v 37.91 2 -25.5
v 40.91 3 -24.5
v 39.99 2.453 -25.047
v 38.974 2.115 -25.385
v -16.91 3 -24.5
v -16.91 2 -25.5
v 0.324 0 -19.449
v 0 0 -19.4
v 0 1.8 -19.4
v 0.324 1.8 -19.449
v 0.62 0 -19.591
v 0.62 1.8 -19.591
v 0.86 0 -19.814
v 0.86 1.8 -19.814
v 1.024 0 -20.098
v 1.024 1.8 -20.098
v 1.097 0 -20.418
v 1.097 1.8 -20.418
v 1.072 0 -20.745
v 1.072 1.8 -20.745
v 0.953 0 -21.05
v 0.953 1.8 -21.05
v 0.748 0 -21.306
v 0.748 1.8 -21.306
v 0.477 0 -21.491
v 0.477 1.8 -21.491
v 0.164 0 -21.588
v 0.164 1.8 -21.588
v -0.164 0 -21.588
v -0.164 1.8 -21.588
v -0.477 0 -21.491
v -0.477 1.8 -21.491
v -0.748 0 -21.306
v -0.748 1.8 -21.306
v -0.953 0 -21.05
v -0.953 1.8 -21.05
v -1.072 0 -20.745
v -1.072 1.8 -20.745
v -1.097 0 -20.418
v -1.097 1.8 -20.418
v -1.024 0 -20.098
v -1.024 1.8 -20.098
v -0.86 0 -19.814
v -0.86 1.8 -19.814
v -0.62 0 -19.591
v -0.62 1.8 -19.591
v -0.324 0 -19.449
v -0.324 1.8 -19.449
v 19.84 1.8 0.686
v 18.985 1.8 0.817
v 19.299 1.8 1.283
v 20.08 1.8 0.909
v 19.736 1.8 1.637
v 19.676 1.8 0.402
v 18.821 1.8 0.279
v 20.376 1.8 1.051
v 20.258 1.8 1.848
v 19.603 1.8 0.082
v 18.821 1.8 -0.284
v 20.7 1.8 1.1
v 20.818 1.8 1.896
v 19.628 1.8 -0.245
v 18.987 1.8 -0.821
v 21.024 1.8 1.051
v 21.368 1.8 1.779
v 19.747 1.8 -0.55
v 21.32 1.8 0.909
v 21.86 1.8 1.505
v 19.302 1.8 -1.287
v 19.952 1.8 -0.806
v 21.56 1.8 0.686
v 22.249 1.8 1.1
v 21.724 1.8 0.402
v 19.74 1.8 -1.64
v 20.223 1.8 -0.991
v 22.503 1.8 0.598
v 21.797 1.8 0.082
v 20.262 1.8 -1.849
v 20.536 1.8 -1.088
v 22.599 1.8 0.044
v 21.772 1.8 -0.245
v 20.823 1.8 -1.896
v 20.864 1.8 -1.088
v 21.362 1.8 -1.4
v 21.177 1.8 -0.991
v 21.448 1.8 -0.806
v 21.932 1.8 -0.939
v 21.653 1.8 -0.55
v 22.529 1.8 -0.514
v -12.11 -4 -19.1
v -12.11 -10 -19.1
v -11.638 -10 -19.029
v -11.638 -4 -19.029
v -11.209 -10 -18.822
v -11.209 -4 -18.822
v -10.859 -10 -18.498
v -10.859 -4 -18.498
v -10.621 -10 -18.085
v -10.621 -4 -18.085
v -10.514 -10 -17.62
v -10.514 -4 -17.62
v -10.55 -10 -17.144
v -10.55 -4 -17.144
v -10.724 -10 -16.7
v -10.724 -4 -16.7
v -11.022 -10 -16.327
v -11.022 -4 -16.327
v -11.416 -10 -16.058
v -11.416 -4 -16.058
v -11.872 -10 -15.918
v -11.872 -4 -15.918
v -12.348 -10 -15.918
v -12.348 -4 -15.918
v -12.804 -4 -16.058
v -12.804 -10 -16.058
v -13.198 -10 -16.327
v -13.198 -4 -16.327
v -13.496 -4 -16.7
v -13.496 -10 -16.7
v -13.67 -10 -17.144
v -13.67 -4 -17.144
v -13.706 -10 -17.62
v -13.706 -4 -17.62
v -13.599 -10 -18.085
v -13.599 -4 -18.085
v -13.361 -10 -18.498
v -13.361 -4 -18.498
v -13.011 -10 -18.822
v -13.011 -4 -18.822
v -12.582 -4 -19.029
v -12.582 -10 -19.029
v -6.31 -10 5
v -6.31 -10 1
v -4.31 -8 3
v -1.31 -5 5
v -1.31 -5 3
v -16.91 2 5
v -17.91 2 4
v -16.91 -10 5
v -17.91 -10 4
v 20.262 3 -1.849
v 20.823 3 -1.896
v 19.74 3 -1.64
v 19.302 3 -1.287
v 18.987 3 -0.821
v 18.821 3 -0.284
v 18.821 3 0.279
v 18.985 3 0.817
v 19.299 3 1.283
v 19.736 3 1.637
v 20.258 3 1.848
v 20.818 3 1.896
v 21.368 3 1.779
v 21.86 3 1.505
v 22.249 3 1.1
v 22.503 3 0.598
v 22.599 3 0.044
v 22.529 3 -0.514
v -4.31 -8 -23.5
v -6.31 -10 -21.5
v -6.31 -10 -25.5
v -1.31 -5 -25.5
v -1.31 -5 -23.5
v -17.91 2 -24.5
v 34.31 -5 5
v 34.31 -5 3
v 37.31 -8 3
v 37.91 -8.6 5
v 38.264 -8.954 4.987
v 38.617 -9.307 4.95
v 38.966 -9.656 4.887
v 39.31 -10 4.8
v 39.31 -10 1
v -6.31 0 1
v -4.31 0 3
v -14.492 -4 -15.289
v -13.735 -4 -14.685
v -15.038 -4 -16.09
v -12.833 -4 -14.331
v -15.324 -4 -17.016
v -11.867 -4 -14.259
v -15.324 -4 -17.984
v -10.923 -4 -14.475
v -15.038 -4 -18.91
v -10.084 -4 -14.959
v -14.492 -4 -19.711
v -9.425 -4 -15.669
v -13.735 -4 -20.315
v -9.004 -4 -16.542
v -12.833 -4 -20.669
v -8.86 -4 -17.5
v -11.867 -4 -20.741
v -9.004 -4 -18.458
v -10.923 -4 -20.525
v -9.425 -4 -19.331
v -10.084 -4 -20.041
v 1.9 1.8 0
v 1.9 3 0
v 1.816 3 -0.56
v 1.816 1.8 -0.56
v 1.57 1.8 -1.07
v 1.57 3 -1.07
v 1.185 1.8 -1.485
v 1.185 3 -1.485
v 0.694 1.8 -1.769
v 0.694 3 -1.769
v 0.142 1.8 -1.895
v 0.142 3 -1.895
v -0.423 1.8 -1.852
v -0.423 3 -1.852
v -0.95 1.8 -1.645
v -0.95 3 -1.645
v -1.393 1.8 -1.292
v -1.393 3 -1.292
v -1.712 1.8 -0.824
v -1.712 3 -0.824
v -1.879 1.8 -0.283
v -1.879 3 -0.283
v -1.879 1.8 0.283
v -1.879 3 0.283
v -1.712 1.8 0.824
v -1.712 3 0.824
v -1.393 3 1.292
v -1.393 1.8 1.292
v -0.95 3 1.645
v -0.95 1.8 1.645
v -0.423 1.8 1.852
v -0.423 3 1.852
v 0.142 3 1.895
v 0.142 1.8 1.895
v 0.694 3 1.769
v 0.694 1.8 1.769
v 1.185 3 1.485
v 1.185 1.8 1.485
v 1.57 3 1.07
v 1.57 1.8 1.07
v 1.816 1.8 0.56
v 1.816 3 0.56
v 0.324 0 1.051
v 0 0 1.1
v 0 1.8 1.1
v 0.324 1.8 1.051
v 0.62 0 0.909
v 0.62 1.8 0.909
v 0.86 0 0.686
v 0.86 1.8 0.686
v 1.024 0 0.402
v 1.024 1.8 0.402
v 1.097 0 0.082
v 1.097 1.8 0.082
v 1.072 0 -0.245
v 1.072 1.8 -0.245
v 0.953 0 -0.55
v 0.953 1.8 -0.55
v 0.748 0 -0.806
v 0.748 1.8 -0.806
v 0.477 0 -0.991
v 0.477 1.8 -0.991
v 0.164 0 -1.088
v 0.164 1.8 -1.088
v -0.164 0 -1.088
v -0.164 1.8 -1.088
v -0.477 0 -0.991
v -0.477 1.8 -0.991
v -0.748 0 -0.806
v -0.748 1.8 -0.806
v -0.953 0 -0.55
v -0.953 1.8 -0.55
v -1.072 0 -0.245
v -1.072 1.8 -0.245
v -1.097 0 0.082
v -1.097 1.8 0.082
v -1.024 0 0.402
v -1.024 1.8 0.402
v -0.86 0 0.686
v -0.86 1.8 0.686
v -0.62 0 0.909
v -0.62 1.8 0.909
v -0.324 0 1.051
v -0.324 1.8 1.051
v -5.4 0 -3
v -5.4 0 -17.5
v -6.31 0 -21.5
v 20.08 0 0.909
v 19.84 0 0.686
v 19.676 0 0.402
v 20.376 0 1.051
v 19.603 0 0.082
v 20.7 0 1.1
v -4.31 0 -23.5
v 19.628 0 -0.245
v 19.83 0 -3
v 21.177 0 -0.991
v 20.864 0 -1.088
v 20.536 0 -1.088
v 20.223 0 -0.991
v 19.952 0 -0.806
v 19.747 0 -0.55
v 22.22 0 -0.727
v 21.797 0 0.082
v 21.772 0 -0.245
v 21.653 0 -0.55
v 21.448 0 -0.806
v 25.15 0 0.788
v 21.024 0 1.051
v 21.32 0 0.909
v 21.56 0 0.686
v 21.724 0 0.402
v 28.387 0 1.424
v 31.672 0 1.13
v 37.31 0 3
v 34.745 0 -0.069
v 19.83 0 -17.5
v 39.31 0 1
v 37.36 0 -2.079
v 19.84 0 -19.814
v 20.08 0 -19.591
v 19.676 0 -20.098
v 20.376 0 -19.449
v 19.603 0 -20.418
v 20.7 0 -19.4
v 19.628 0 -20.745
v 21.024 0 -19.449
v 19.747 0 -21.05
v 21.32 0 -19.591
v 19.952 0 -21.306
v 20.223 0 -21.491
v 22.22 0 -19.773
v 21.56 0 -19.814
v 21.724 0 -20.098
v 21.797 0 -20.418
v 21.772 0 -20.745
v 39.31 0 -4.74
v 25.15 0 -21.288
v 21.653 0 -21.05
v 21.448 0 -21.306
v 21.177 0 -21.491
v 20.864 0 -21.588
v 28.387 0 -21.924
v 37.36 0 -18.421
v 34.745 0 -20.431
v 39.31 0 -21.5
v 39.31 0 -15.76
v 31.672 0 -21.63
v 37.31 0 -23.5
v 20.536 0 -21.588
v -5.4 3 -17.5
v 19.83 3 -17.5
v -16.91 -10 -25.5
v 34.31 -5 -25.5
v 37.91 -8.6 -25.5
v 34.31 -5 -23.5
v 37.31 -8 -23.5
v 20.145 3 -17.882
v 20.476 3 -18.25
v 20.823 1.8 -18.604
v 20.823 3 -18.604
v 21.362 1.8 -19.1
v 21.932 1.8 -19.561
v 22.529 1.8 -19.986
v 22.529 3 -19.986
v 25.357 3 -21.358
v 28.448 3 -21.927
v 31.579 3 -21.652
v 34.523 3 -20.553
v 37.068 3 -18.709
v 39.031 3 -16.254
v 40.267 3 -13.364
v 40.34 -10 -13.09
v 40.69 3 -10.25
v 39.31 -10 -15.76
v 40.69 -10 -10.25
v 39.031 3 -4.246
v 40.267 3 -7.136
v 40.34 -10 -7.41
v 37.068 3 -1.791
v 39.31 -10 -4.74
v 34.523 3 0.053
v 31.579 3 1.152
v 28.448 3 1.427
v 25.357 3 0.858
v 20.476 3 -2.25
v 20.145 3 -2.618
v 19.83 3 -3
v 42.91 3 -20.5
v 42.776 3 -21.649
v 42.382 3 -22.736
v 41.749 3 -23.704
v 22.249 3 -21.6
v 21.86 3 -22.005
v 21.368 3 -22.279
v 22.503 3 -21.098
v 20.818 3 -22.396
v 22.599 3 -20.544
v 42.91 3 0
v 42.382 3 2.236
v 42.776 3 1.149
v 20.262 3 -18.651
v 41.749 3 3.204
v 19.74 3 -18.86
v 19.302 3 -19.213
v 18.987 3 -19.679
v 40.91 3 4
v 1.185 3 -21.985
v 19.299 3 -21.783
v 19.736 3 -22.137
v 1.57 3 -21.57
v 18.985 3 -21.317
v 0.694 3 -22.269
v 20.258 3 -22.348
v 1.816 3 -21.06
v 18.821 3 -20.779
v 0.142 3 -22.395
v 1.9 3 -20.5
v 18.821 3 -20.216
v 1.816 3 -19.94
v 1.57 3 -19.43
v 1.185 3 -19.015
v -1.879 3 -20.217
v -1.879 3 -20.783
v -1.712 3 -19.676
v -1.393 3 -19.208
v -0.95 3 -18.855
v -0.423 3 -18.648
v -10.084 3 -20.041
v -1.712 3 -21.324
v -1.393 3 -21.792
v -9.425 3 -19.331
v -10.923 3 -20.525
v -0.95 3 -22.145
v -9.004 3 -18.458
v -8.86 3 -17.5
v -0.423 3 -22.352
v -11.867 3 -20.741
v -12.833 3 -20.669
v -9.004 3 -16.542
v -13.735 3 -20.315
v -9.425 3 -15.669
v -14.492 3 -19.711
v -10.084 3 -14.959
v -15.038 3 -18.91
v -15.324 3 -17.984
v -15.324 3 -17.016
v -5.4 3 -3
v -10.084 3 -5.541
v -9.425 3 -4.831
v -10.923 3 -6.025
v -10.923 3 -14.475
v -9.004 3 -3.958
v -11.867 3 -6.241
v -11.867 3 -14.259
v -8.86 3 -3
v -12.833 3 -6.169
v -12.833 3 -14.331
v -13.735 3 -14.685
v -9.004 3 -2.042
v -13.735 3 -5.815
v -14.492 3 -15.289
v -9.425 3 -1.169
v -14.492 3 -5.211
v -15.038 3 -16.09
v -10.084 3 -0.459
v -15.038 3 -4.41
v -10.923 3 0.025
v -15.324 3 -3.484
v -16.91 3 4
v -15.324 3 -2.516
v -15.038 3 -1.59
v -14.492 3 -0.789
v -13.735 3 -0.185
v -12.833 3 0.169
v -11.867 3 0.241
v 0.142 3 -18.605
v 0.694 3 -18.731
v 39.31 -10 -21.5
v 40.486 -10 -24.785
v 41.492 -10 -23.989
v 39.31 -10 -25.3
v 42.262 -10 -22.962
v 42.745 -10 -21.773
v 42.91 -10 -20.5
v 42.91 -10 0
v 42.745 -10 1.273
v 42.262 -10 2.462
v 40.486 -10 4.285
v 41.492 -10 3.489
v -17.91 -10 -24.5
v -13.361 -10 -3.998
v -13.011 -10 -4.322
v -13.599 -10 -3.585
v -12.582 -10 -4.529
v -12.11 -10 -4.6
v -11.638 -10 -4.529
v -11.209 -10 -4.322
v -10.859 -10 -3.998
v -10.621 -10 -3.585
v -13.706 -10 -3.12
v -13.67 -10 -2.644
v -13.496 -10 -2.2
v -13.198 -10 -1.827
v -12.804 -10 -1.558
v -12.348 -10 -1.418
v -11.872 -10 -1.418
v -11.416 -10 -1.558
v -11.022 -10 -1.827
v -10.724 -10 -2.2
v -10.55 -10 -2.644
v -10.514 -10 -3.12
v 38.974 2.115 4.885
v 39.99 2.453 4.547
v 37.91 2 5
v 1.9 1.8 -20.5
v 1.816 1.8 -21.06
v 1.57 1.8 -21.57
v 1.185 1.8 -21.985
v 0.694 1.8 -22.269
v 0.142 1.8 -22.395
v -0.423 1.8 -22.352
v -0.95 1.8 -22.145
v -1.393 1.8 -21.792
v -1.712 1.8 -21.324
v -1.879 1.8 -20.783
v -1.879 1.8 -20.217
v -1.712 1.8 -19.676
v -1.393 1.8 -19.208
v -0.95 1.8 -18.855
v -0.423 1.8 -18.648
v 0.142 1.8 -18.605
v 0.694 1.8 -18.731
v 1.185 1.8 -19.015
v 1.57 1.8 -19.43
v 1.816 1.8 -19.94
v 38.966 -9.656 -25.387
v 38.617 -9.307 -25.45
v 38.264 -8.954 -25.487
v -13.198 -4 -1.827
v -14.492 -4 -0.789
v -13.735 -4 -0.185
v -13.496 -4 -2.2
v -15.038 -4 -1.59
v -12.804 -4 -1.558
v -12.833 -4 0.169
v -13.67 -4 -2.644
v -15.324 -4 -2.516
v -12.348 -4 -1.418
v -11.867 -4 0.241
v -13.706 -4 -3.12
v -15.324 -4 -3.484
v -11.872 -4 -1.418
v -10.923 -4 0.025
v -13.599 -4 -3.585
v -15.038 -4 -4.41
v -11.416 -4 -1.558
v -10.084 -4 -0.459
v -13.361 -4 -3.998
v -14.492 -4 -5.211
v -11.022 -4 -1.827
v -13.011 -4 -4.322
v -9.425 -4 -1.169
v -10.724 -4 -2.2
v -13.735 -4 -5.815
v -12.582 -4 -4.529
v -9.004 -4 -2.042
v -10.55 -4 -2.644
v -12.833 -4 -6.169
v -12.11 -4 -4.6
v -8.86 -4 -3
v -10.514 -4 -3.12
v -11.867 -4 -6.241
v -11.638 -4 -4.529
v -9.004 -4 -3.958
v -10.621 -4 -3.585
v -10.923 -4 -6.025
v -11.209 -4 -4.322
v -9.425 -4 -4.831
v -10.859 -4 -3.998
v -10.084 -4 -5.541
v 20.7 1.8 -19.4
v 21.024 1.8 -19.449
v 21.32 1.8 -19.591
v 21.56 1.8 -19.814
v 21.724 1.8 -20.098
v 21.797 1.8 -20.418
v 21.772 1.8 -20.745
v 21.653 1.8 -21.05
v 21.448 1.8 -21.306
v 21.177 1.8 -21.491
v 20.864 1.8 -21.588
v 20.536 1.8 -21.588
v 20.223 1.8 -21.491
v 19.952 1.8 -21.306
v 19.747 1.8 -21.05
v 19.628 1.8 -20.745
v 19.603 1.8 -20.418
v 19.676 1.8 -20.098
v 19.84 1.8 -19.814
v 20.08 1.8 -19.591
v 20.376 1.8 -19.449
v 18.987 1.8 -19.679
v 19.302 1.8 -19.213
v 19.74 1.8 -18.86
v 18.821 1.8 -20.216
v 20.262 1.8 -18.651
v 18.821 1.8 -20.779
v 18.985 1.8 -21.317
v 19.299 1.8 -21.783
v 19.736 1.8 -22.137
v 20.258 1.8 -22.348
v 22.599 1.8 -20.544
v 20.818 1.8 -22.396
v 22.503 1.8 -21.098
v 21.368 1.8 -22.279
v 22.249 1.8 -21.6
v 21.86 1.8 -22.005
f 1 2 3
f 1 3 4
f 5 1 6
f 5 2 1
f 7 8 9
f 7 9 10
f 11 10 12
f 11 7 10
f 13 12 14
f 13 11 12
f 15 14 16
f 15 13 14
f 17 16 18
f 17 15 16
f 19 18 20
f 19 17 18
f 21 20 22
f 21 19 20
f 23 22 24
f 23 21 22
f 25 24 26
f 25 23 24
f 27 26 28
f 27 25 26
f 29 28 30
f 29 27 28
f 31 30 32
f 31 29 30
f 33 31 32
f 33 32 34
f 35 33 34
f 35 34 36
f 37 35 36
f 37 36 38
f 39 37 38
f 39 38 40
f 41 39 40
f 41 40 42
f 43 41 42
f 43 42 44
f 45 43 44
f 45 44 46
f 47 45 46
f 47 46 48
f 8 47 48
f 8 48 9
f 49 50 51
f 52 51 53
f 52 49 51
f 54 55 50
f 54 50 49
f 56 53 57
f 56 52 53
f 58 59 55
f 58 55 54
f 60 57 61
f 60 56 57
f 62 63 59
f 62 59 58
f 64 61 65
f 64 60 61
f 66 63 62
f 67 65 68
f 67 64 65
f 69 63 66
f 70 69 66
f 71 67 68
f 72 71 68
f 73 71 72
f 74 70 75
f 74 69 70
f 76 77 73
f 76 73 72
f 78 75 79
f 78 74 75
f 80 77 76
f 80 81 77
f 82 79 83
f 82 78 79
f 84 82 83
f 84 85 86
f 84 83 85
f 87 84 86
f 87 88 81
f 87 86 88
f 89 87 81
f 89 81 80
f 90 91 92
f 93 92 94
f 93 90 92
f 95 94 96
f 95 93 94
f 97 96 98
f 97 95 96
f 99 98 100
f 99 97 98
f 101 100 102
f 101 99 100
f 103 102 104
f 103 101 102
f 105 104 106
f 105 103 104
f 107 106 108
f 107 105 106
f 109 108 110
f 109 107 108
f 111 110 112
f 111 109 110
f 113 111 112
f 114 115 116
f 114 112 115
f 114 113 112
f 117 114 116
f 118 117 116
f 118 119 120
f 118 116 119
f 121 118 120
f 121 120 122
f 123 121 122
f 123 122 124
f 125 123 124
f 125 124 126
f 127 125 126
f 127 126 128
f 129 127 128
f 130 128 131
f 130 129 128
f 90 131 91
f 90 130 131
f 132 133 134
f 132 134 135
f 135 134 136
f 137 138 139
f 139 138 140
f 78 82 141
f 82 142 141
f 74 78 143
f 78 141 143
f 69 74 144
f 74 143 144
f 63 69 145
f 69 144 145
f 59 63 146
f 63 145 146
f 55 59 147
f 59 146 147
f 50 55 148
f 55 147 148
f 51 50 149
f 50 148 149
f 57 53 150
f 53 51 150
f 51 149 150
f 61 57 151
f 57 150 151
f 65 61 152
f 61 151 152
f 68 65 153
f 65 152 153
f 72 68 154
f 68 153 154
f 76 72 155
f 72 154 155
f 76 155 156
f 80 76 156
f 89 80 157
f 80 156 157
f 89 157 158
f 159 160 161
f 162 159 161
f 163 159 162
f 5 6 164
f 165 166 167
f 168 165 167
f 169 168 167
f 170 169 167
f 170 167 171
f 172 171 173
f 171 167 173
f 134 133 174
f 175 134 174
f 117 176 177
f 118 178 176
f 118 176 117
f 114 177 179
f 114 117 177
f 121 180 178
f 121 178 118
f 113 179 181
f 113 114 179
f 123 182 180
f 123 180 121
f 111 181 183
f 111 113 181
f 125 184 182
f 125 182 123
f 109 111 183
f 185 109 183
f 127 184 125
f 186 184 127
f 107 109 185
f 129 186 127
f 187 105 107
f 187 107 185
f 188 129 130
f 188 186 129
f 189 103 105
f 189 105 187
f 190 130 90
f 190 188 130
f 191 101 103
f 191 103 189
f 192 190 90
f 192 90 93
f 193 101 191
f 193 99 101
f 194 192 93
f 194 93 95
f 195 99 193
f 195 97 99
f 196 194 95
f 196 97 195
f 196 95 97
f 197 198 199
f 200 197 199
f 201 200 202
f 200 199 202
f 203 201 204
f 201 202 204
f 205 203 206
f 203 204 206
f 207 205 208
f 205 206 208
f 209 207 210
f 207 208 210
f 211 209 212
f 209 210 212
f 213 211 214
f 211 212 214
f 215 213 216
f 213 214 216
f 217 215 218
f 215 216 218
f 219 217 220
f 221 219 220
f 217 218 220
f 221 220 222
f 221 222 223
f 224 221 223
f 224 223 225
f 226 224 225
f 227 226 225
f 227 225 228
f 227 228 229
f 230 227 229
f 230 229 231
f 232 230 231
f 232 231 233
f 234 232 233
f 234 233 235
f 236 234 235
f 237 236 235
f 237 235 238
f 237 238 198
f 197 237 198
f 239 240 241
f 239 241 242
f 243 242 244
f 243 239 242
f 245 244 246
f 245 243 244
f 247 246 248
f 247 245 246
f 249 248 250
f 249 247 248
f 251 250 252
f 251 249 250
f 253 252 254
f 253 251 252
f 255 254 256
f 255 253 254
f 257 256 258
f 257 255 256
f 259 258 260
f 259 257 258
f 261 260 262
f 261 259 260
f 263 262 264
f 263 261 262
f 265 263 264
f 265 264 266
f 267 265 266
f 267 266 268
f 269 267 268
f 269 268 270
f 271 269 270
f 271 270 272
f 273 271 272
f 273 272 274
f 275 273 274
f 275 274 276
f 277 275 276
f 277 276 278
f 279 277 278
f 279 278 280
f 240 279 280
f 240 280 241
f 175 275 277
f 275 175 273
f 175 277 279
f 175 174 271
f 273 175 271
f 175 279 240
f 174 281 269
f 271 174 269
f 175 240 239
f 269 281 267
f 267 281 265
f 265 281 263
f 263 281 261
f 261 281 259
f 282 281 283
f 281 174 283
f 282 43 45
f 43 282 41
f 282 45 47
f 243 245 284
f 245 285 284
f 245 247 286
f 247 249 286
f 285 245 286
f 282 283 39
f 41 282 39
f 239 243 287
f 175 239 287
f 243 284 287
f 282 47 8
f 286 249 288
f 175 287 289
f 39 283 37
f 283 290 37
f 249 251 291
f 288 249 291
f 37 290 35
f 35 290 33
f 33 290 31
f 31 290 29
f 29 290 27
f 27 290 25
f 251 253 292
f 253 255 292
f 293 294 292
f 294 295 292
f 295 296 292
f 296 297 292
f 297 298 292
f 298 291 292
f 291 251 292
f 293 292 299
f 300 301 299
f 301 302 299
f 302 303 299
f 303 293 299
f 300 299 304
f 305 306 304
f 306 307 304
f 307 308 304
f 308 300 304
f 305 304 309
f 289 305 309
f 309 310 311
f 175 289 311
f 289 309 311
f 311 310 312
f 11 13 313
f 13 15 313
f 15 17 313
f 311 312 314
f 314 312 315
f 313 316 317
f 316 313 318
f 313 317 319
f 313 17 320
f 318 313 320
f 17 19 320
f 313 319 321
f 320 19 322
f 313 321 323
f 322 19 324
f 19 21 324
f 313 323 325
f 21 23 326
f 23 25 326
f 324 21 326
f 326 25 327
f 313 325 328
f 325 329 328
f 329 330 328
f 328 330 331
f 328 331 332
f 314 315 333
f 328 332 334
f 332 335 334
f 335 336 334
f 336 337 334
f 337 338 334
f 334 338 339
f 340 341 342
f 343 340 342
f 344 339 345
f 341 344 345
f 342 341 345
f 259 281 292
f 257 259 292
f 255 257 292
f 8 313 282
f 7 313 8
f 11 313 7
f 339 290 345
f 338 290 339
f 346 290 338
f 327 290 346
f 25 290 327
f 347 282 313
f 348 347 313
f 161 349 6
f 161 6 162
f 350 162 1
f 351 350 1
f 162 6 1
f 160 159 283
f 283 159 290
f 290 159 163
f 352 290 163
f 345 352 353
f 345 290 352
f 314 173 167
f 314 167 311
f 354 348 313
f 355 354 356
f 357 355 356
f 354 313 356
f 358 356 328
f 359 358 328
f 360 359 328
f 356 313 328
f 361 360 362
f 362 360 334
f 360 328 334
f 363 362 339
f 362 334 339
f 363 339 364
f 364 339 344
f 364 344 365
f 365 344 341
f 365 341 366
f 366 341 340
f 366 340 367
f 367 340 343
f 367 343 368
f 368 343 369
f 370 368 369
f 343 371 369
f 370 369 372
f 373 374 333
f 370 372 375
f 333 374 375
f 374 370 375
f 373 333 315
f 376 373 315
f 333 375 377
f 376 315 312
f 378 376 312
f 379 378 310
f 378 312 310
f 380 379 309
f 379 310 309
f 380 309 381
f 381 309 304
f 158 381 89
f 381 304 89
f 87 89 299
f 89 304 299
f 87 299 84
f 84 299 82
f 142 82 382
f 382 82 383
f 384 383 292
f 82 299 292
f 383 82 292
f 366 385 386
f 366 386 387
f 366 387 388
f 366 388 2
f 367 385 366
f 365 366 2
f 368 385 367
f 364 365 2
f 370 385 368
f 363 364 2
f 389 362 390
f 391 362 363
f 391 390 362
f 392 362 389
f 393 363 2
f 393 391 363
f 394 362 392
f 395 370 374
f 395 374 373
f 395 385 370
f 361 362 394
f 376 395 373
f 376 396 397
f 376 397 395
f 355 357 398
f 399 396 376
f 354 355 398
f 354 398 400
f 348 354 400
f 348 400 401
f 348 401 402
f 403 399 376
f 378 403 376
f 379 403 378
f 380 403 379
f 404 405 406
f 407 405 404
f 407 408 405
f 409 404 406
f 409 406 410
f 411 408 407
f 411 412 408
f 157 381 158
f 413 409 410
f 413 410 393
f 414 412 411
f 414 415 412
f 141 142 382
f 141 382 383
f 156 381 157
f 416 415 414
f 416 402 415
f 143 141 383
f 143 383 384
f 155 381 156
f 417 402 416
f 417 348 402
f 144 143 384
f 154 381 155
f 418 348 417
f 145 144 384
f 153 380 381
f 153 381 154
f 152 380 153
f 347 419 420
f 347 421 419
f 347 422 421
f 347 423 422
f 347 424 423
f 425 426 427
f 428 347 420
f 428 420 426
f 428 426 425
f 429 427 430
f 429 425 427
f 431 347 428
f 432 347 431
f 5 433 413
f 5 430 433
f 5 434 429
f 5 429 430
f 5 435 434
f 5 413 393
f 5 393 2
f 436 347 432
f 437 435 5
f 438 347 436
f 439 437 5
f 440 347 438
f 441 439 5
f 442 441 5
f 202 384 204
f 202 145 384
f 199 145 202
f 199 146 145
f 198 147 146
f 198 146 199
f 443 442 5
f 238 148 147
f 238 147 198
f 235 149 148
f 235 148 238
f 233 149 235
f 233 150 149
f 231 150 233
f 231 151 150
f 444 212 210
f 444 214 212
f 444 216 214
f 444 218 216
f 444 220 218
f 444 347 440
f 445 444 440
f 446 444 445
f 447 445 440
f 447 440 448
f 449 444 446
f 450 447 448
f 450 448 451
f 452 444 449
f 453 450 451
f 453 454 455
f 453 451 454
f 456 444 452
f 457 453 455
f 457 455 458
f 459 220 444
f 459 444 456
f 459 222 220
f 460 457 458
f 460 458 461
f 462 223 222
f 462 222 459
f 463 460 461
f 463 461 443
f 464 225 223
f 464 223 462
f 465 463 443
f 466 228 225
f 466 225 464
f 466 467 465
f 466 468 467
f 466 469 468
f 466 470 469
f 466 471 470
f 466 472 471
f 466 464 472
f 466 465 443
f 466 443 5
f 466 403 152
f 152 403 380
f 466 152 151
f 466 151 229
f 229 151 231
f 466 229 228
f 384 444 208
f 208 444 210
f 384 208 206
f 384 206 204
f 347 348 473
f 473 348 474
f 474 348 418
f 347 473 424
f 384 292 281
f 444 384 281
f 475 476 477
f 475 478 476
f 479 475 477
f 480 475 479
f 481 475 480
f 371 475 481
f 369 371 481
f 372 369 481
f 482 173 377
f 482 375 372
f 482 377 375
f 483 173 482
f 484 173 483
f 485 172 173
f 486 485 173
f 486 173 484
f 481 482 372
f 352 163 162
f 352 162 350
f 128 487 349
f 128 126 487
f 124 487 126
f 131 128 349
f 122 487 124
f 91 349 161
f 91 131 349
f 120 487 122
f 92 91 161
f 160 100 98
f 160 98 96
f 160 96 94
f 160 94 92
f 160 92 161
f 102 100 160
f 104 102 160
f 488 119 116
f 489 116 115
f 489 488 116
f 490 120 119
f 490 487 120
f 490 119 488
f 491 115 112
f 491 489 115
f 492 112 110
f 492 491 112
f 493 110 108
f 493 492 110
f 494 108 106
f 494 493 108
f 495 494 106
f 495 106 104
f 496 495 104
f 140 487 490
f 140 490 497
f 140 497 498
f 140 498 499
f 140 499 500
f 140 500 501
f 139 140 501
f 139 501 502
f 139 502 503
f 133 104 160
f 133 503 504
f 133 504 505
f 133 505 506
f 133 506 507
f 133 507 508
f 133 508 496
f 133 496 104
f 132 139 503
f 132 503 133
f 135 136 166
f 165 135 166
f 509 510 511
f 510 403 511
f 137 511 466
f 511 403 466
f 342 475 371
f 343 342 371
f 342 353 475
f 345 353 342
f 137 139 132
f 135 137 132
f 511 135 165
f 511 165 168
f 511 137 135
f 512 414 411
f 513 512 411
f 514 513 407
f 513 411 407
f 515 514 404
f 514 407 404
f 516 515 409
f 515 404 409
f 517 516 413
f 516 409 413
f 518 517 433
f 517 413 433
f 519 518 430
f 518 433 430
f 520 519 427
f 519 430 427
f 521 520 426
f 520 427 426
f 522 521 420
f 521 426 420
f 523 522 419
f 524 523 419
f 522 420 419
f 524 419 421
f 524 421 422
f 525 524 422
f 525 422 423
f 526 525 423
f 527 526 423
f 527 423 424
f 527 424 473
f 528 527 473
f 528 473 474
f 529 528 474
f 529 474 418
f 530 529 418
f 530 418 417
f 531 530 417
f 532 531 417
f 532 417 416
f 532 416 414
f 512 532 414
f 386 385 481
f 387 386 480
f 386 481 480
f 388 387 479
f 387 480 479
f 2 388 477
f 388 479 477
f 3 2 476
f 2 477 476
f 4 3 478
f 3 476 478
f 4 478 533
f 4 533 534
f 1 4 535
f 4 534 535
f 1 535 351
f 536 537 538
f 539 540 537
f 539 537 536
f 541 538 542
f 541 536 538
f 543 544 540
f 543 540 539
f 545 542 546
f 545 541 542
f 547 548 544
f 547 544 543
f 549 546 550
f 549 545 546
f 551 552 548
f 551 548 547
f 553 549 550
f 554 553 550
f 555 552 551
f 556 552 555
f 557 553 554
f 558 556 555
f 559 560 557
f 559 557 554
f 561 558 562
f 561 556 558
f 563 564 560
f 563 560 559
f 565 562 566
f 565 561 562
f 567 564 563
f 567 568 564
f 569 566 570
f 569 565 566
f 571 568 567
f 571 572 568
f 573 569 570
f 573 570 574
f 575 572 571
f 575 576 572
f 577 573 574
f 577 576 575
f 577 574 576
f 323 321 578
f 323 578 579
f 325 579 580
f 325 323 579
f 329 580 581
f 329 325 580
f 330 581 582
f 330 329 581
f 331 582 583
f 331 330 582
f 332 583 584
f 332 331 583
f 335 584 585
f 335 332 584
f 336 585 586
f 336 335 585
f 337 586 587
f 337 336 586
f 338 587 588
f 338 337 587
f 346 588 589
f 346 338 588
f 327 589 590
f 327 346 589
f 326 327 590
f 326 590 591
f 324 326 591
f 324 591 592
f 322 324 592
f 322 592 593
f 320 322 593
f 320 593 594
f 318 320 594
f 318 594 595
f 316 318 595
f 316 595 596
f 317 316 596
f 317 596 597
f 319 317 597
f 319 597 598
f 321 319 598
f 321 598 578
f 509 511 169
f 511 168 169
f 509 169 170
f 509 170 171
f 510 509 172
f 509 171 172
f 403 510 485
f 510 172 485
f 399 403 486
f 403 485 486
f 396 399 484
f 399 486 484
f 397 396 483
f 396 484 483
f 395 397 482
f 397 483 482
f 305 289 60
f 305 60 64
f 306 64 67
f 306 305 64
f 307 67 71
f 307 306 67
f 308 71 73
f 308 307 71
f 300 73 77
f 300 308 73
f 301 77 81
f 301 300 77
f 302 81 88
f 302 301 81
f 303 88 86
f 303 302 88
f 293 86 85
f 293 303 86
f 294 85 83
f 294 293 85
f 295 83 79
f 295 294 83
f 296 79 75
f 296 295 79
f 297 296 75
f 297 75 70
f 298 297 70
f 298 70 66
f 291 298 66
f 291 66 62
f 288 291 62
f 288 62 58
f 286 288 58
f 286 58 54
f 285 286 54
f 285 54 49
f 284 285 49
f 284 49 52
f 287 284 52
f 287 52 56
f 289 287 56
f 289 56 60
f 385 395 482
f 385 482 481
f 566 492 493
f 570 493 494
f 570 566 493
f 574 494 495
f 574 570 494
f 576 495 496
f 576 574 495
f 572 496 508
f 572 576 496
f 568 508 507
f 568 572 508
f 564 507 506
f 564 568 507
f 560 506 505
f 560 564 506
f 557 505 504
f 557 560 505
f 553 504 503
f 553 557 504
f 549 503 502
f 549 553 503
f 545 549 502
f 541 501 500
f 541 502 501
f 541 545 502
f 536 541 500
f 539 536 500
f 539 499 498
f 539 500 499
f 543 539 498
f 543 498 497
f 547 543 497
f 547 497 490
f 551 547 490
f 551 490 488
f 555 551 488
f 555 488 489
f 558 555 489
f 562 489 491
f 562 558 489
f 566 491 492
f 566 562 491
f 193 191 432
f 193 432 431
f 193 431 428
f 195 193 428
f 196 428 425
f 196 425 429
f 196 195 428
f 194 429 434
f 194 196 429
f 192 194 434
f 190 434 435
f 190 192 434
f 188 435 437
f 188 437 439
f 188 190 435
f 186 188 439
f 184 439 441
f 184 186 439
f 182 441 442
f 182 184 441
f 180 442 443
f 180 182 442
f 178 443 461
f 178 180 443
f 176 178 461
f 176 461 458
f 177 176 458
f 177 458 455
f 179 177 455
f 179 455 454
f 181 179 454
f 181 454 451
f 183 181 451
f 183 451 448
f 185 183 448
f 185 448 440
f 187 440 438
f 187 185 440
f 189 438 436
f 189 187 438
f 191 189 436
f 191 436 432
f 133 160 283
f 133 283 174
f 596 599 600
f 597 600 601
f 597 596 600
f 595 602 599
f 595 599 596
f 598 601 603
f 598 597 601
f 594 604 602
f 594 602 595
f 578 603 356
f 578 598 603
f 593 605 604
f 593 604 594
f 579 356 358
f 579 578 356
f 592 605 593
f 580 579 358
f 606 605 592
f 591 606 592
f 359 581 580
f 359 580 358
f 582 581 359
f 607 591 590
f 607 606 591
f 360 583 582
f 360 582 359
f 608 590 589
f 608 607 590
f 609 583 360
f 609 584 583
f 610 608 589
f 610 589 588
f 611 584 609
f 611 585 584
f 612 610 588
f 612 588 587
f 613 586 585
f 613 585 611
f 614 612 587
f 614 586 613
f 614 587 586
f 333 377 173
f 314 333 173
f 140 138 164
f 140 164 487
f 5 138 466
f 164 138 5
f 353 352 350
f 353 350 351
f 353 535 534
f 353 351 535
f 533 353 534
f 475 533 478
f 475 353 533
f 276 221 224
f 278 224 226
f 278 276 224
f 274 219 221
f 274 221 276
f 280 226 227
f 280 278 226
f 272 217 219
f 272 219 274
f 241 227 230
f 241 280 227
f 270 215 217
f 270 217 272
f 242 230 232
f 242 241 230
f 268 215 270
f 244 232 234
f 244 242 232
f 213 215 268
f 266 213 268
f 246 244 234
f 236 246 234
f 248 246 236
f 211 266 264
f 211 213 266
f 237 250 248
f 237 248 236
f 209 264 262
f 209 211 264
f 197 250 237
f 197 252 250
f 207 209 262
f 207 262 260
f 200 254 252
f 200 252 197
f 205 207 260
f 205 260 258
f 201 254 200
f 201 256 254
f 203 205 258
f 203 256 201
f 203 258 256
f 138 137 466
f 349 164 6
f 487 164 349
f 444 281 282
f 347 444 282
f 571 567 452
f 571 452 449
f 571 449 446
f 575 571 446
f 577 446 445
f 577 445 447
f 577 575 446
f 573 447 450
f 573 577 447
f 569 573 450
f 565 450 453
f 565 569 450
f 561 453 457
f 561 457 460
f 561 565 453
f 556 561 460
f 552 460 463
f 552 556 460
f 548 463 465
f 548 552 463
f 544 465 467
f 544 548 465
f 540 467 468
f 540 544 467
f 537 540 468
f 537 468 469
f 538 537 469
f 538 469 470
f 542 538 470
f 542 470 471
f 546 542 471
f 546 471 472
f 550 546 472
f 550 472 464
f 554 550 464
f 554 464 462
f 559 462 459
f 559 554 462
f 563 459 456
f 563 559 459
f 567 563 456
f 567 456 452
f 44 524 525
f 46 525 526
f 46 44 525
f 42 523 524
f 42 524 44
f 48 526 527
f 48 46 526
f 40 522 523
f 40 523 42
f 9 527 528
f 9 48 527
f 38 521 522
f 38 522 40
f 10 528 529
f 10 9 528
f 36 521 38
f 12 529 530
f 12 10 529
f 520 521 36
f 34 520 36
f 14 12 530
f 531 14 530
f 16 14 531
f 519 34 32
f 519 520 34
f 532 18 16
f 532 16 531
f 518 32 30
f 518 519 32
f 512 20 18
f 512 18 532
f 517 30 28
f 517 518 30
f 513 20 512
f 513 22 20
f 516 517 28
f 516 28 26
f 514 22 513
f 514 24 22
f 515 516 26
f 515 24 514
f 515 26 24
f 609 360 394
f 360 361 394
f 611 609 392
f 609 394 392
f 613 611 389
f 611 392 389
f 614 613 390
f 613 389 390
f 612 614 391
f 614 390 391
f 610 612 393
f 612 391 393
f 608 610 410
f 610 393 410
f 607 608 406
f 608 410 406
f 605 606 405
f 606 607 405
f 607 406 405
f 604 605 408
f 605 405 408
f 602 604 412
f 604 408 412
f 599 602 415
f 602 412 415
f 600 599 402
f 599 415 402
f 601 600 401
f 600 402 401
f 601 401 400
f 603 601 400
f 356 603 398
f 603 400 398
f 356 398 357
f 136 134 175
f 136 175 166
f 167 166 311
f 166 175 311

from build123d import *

# Parameters (mm, degrees)
ESQUISSE1_W                                        = 53.8
ESQUISSE1_H                                        = 26.5
ESQUISSE1_R                                        = 1.1
BOSS_EXTRU_1_DEPTH                                 = 3
CHAMBRAGE_POUR_VIS_SIX_PANS_CREUX_M1_6_D           = 2.2
CHAMBRAGE_POUR_VIS_SIX_PANS_CREUX_M1_6_CBORE_D     = 3.8
CHAMBRAGE_POUR_VIS_SIX_PANS_CREUX_M1_6_CBORE_DEPTH = 1.2
BOSS_EXTRU_2_START                                 = 16
BOSS_EXTRU_2_DEPTH                                 = 19
ESQUISSE6_W                                        = 11.6
ESQUISSE6_H                                        = 6
ENL_V_MAT_EXTRU_1_DEPTH                            = 60.582531836
ENL_V_MAT_EXTRU_2_DEPTH                            = 58.559344159
ENL_V_MAT_EXTRU_2_DEPTH_BACK                       = 58.559344159
ESQUISSE7_R                                        = 1.6
PER_AGEAVANC_1_START                               = -4
PER_AGEAVANC_1_OUTLINE_R                           = 3.25
PER_AGEAVANC_1_OUTLINE_R_2                         = 1.6
PER_AGEAVANC_1_DEPTH                               = 7
BOSS_EXTRU_3_DEPTH                                 = 2
ESQUISSE11_R                                       = 3.860993261
BOSS_EXTRU_4_DEPTH                                 = 13
ESQUISSE12_W                                       = 8
ESQUISSE12_H                                       = 30.5
ENL_V_MAT_EXTRU_3_DEPTH                            = 59.404435619
CHANFREIN1_SIZE                                    = 1
CONG_1_R                                           = 5
CHANFREIN2_SIZE                                    = 2


with BuildPart() as part:
    # Esquisse1 → Boss.-Extru.1 (new body)
    with BuildSketch(Plane(origin=(0, 0, 0), x_dir=(1, 0, 0), z_dir=(0, 1, 0))):
        with Locations((16.5, 10.25)):
            Rectangle(ESQUISSE1_W, ESQUISSE1_H)
        with Locations(Location((0, 0, 0), (0, 0, 270))):
            Circle(ESQUISSE1_R, mode=Mode.SUBTRACT)
        with Locations(Location((20.7, 0, 0), (0, 0, 270))):
            Circle(ESQUISSE1_R, mode=Mode.SUBTRACT)
        with Locations(Location((0, 20.5, 0), (0, 0, 270))):
            Circle(ESQUISSE1_R, mode=Mode.SUBTRACT)
        with BuildLine():
            Line((-5.4, 3), (-5.4, 17.5))
            Line((-5.4, 17.5), (19.829743733, 17.5))
            ThreePointArc((19.829743733, 17.5), (32.837694897, 21.29211021), (40.69, 10.25))
            ThreePointArc((40.69, 10.25), (32.837694897, -0.79211021), (19.829743733, 3))
            Line((19.829743733, 3), (-5.4, 3))
        make_face(mode=Mode.SUBTRACT)
        with Locations(Location((20.7, 20.5, 0), (0, 0, 270))):
            Circle(ESQUISSE1_R, mode=Mode.SUBTRACT)
    extrude(amount=BOSS_EXTRU_1_DEPTH)

    # Chambrage pour vis à six pans creux M1.61 (through all)
    with Locations(Plane(origin=(0, 3, 0), x_dir=(1, 0, 0), z_dir=(0, 1, 0))):
        with Locations((0, 20.5), (20.7, 20.5), (20.7, 0), (0, 0)):
            CounterBoreHole(CHAMBRAGE_POUR_VIS_SIX_PANS_CREUX_M1_6_D / 2, CHAMBRAGE_POUR_VIS_SIX_PANS_CREUX_M1_6_CBORE_D / 2, CHAMBRAGE_POUR_VIS_SIX_PANS_CREUX_M1_6_CBORE_DEPTH)

    # Esquisse4 → Boss.-Extru.2 (add)
    with BuildSketch(Plane.XZ.offset(BOSS_EXTRU_2_START)):
        Polygon((-10.4, 3), (-17.91, 3), (-17.91, -23.5), (-10.4, -23.5), (-6.31, -23.5), (-6.31, 3), align=None)
        with BuildLine():
            Line((39.31, 3), (50.91, 3))
            Line((50.91, 3), (50.91, -23.5))
            Line((50.91, -23.5), (39.31, -23.5))
            Line((39.31, -23.5), (39.31, -15.759990926))
            ThreePointArc((39.31, -15.759990926), (40.69, -10.25), (39.31, -4.740009074))
            Line((39.31, -4.740009074), (39.31, 3))
        make_face()
    extrude(amount=-BOSS_EXTRU_2_DEPTH)

    # Esquisse6 → Enlèv. mat.-Extru.1 (cut, through all)
    with BuildSketch(Plane(origin=(0, 0, -23.5), x_dir=(-1, 0, 0), z_dir=(0, 0, -1))):
        with Locations((12.11, -13)):
            Rectangle(ESQUISSE6_W, ESQUISSE6_H)
        with Locations((-45.11, -13)):
            Rectangle(ESQUISSE6_W, ESQUISSE6_H)
    extrude(amount=-ENL_V_MAT_EXTRU_1_DEPTH, mode=Mode.SUBTRACT)

    # Esquisse7 → Enlèv. mat.-Extru.2 (cut, two sides: drawn at the far end of the back side and taken through both)
    with BuildSketch(Plane.XZ.offset(10).offset(-ENL_V_MAT_EXTRU_2_DEPTH_BACK)):
        with Locations(Location((-12.11, -3, 0), (0, 0, 270))):
            Circle(ESQUISSE7_R)
        with Locations(Location((-12.11, -17.5, 0), (0, 0, 270))):
            Circle(ESQUISSE7_R)
        with Locations(Location((45.11, -10.25, 0), (0, 0, 270))):
            Circle(ESQUISSE7_R)
    extrude(amount=ENL_V_MAT_EXTRU_2_DEPTH + ENL_V_MAT_EXTRU_2_DEPTH_BACK, mode=Mode.SUBTRACT)

    # PerçageAvancé1: read off the stored shape, not the designer's step
    # PerçageAvancé1 outline → PerçageAvancé1 (cut)
    # profile 1 of 3: a face of its own
    with BuildSketch(Plane(origin=(0, 0, 0), x_dir=(1, 0, 0), z_dir=(0, 1, 0)).offset(PER_AGEAVANC_1_START)):
        with Locations((-12.11, 17.5)):
            Circle(PER_AGEAVANC_1_OUTLINE_R)
        with Locations((-12.11, 17.5)):
            Circle(PER_AGEAVANC_1_OUTLINE_R_2, mode=Mode.SUBTRACT)
    # profile 2 of 3: a face of its own
    with BuildSketch(Plane(origin=(0, 0, 0), x_dir=(1, 0, 0), z_dir=(0, 1, 0)).offset(PER_AGEAVANC_1_START)):
        with Locations((-12.11, 3)):
            Circle(PER_AGEAVANC_1_OUTLINE_R)
        with Locations((-12.11, 3)):
            Circle(PER_AGEAVANC_1_OUTLINE_R_2, mode=Mode.SUBTRACT)
    # profile 3 of 3: a face of its own
    with BuildSketch(Plane(origin=(0, 0, 0), x_dir=(1, 0, 0), z_dir=(0, 1, 0)).offset(PER_AGEAVANC_1_START)):
        with Locations((45.11, 10.25)):
            Circle(PER_AGEAVANC_1_OUTLINE_R)
        with Locations((45.11, 10.25)):
            Circle(PER_AGEAVANC_1_OUTLINE_R_2, mode=Mode.SUBTRACT)
    extrude(amount=PER_AGEAVANC_1_DEPTH, mode=Mode.SUBTRACT)

    # Esquisse10 → Boss.-Extru.3 (add)
    with BuildSketch(Plane.XY.offset(3)):
        Polygon((-6.31, -10), (-1.31, -5), (34.31, -5), (39.31, -10), (50.91, -10), (50.91, 3), (-17.91, 3), (-17.91, -10), align=None)
    boss_extru_3 = extrude(amount=BOSS_EXTRU_3_DEPTH)

    # Symétrie1: Boss.-Extru.3 across plane
    add(boss_extru_3.mirror(Plane.XY.offset(-10.25)))

    # Esquisse11 → Boss.-Extru.4 (add)
    with BuildSketch(Plane(origin=(0, 3, 0), x_dir=(1, 0, 0), z_dir=(0, 1, 0))):
        with Locations((45.11, 10.25)):
            Circle(ESQUISSE11_R)
    extrude(amount=-BOSS_EXTRU_4_DEPTH)

    # Esquisse12 → Enlèv. mat.-Extru.3 (cut, through all)
    with BuildSketch(Plane(origin=(0, 3, 0), x_dir=(1, 0, 0), z_dir=(0, 1, 0))):
        with Locations((46.91, 10.25)):
            Rectangle(ESQUISSE12_W, ESQUISSE12_H)
    extrude(amount=-ENL_V_MAT_EXTRU_3_DEPTH, mode=Mode.SUBTRACT)

    # Chanfrein1
    chanfrein1_edges = [part.edges().sort_by_distance(p)[0] for p in [
        (-17.91, -3.5, 5),
        (-17.91, -3.5, -25.5),
        (12.5, 3, -25.5),
        (12.5, 3, 5),
        (-17.91, 3, -10.25),
    ]]
    chamfer(chanfrein1_edges, length=CHANFREIN1_SIZE)

    # Congé1
    cong_1_edges = [part.edges().sort_by_distance(p)[0] for p in [
        (42.91, -4, -25.5),
        (42.91, -4, 5),
    ]]
    fillet(cong_1_edges, radius=CONG_1_R)

    # Chanfrein2
    chanfrein2_edges = [part.edges().sort_by_distance(p)[0] for p in [
        (-6.31, -5, -23.5),
        (-6.31, -5, 3),
        (39.31, -5, 3),
        (39.31, -5, -23.5),
    ]]
    chamfer(chanfrein2_edges, length=CHANFREIN2_SIZE)


solid = part.part
